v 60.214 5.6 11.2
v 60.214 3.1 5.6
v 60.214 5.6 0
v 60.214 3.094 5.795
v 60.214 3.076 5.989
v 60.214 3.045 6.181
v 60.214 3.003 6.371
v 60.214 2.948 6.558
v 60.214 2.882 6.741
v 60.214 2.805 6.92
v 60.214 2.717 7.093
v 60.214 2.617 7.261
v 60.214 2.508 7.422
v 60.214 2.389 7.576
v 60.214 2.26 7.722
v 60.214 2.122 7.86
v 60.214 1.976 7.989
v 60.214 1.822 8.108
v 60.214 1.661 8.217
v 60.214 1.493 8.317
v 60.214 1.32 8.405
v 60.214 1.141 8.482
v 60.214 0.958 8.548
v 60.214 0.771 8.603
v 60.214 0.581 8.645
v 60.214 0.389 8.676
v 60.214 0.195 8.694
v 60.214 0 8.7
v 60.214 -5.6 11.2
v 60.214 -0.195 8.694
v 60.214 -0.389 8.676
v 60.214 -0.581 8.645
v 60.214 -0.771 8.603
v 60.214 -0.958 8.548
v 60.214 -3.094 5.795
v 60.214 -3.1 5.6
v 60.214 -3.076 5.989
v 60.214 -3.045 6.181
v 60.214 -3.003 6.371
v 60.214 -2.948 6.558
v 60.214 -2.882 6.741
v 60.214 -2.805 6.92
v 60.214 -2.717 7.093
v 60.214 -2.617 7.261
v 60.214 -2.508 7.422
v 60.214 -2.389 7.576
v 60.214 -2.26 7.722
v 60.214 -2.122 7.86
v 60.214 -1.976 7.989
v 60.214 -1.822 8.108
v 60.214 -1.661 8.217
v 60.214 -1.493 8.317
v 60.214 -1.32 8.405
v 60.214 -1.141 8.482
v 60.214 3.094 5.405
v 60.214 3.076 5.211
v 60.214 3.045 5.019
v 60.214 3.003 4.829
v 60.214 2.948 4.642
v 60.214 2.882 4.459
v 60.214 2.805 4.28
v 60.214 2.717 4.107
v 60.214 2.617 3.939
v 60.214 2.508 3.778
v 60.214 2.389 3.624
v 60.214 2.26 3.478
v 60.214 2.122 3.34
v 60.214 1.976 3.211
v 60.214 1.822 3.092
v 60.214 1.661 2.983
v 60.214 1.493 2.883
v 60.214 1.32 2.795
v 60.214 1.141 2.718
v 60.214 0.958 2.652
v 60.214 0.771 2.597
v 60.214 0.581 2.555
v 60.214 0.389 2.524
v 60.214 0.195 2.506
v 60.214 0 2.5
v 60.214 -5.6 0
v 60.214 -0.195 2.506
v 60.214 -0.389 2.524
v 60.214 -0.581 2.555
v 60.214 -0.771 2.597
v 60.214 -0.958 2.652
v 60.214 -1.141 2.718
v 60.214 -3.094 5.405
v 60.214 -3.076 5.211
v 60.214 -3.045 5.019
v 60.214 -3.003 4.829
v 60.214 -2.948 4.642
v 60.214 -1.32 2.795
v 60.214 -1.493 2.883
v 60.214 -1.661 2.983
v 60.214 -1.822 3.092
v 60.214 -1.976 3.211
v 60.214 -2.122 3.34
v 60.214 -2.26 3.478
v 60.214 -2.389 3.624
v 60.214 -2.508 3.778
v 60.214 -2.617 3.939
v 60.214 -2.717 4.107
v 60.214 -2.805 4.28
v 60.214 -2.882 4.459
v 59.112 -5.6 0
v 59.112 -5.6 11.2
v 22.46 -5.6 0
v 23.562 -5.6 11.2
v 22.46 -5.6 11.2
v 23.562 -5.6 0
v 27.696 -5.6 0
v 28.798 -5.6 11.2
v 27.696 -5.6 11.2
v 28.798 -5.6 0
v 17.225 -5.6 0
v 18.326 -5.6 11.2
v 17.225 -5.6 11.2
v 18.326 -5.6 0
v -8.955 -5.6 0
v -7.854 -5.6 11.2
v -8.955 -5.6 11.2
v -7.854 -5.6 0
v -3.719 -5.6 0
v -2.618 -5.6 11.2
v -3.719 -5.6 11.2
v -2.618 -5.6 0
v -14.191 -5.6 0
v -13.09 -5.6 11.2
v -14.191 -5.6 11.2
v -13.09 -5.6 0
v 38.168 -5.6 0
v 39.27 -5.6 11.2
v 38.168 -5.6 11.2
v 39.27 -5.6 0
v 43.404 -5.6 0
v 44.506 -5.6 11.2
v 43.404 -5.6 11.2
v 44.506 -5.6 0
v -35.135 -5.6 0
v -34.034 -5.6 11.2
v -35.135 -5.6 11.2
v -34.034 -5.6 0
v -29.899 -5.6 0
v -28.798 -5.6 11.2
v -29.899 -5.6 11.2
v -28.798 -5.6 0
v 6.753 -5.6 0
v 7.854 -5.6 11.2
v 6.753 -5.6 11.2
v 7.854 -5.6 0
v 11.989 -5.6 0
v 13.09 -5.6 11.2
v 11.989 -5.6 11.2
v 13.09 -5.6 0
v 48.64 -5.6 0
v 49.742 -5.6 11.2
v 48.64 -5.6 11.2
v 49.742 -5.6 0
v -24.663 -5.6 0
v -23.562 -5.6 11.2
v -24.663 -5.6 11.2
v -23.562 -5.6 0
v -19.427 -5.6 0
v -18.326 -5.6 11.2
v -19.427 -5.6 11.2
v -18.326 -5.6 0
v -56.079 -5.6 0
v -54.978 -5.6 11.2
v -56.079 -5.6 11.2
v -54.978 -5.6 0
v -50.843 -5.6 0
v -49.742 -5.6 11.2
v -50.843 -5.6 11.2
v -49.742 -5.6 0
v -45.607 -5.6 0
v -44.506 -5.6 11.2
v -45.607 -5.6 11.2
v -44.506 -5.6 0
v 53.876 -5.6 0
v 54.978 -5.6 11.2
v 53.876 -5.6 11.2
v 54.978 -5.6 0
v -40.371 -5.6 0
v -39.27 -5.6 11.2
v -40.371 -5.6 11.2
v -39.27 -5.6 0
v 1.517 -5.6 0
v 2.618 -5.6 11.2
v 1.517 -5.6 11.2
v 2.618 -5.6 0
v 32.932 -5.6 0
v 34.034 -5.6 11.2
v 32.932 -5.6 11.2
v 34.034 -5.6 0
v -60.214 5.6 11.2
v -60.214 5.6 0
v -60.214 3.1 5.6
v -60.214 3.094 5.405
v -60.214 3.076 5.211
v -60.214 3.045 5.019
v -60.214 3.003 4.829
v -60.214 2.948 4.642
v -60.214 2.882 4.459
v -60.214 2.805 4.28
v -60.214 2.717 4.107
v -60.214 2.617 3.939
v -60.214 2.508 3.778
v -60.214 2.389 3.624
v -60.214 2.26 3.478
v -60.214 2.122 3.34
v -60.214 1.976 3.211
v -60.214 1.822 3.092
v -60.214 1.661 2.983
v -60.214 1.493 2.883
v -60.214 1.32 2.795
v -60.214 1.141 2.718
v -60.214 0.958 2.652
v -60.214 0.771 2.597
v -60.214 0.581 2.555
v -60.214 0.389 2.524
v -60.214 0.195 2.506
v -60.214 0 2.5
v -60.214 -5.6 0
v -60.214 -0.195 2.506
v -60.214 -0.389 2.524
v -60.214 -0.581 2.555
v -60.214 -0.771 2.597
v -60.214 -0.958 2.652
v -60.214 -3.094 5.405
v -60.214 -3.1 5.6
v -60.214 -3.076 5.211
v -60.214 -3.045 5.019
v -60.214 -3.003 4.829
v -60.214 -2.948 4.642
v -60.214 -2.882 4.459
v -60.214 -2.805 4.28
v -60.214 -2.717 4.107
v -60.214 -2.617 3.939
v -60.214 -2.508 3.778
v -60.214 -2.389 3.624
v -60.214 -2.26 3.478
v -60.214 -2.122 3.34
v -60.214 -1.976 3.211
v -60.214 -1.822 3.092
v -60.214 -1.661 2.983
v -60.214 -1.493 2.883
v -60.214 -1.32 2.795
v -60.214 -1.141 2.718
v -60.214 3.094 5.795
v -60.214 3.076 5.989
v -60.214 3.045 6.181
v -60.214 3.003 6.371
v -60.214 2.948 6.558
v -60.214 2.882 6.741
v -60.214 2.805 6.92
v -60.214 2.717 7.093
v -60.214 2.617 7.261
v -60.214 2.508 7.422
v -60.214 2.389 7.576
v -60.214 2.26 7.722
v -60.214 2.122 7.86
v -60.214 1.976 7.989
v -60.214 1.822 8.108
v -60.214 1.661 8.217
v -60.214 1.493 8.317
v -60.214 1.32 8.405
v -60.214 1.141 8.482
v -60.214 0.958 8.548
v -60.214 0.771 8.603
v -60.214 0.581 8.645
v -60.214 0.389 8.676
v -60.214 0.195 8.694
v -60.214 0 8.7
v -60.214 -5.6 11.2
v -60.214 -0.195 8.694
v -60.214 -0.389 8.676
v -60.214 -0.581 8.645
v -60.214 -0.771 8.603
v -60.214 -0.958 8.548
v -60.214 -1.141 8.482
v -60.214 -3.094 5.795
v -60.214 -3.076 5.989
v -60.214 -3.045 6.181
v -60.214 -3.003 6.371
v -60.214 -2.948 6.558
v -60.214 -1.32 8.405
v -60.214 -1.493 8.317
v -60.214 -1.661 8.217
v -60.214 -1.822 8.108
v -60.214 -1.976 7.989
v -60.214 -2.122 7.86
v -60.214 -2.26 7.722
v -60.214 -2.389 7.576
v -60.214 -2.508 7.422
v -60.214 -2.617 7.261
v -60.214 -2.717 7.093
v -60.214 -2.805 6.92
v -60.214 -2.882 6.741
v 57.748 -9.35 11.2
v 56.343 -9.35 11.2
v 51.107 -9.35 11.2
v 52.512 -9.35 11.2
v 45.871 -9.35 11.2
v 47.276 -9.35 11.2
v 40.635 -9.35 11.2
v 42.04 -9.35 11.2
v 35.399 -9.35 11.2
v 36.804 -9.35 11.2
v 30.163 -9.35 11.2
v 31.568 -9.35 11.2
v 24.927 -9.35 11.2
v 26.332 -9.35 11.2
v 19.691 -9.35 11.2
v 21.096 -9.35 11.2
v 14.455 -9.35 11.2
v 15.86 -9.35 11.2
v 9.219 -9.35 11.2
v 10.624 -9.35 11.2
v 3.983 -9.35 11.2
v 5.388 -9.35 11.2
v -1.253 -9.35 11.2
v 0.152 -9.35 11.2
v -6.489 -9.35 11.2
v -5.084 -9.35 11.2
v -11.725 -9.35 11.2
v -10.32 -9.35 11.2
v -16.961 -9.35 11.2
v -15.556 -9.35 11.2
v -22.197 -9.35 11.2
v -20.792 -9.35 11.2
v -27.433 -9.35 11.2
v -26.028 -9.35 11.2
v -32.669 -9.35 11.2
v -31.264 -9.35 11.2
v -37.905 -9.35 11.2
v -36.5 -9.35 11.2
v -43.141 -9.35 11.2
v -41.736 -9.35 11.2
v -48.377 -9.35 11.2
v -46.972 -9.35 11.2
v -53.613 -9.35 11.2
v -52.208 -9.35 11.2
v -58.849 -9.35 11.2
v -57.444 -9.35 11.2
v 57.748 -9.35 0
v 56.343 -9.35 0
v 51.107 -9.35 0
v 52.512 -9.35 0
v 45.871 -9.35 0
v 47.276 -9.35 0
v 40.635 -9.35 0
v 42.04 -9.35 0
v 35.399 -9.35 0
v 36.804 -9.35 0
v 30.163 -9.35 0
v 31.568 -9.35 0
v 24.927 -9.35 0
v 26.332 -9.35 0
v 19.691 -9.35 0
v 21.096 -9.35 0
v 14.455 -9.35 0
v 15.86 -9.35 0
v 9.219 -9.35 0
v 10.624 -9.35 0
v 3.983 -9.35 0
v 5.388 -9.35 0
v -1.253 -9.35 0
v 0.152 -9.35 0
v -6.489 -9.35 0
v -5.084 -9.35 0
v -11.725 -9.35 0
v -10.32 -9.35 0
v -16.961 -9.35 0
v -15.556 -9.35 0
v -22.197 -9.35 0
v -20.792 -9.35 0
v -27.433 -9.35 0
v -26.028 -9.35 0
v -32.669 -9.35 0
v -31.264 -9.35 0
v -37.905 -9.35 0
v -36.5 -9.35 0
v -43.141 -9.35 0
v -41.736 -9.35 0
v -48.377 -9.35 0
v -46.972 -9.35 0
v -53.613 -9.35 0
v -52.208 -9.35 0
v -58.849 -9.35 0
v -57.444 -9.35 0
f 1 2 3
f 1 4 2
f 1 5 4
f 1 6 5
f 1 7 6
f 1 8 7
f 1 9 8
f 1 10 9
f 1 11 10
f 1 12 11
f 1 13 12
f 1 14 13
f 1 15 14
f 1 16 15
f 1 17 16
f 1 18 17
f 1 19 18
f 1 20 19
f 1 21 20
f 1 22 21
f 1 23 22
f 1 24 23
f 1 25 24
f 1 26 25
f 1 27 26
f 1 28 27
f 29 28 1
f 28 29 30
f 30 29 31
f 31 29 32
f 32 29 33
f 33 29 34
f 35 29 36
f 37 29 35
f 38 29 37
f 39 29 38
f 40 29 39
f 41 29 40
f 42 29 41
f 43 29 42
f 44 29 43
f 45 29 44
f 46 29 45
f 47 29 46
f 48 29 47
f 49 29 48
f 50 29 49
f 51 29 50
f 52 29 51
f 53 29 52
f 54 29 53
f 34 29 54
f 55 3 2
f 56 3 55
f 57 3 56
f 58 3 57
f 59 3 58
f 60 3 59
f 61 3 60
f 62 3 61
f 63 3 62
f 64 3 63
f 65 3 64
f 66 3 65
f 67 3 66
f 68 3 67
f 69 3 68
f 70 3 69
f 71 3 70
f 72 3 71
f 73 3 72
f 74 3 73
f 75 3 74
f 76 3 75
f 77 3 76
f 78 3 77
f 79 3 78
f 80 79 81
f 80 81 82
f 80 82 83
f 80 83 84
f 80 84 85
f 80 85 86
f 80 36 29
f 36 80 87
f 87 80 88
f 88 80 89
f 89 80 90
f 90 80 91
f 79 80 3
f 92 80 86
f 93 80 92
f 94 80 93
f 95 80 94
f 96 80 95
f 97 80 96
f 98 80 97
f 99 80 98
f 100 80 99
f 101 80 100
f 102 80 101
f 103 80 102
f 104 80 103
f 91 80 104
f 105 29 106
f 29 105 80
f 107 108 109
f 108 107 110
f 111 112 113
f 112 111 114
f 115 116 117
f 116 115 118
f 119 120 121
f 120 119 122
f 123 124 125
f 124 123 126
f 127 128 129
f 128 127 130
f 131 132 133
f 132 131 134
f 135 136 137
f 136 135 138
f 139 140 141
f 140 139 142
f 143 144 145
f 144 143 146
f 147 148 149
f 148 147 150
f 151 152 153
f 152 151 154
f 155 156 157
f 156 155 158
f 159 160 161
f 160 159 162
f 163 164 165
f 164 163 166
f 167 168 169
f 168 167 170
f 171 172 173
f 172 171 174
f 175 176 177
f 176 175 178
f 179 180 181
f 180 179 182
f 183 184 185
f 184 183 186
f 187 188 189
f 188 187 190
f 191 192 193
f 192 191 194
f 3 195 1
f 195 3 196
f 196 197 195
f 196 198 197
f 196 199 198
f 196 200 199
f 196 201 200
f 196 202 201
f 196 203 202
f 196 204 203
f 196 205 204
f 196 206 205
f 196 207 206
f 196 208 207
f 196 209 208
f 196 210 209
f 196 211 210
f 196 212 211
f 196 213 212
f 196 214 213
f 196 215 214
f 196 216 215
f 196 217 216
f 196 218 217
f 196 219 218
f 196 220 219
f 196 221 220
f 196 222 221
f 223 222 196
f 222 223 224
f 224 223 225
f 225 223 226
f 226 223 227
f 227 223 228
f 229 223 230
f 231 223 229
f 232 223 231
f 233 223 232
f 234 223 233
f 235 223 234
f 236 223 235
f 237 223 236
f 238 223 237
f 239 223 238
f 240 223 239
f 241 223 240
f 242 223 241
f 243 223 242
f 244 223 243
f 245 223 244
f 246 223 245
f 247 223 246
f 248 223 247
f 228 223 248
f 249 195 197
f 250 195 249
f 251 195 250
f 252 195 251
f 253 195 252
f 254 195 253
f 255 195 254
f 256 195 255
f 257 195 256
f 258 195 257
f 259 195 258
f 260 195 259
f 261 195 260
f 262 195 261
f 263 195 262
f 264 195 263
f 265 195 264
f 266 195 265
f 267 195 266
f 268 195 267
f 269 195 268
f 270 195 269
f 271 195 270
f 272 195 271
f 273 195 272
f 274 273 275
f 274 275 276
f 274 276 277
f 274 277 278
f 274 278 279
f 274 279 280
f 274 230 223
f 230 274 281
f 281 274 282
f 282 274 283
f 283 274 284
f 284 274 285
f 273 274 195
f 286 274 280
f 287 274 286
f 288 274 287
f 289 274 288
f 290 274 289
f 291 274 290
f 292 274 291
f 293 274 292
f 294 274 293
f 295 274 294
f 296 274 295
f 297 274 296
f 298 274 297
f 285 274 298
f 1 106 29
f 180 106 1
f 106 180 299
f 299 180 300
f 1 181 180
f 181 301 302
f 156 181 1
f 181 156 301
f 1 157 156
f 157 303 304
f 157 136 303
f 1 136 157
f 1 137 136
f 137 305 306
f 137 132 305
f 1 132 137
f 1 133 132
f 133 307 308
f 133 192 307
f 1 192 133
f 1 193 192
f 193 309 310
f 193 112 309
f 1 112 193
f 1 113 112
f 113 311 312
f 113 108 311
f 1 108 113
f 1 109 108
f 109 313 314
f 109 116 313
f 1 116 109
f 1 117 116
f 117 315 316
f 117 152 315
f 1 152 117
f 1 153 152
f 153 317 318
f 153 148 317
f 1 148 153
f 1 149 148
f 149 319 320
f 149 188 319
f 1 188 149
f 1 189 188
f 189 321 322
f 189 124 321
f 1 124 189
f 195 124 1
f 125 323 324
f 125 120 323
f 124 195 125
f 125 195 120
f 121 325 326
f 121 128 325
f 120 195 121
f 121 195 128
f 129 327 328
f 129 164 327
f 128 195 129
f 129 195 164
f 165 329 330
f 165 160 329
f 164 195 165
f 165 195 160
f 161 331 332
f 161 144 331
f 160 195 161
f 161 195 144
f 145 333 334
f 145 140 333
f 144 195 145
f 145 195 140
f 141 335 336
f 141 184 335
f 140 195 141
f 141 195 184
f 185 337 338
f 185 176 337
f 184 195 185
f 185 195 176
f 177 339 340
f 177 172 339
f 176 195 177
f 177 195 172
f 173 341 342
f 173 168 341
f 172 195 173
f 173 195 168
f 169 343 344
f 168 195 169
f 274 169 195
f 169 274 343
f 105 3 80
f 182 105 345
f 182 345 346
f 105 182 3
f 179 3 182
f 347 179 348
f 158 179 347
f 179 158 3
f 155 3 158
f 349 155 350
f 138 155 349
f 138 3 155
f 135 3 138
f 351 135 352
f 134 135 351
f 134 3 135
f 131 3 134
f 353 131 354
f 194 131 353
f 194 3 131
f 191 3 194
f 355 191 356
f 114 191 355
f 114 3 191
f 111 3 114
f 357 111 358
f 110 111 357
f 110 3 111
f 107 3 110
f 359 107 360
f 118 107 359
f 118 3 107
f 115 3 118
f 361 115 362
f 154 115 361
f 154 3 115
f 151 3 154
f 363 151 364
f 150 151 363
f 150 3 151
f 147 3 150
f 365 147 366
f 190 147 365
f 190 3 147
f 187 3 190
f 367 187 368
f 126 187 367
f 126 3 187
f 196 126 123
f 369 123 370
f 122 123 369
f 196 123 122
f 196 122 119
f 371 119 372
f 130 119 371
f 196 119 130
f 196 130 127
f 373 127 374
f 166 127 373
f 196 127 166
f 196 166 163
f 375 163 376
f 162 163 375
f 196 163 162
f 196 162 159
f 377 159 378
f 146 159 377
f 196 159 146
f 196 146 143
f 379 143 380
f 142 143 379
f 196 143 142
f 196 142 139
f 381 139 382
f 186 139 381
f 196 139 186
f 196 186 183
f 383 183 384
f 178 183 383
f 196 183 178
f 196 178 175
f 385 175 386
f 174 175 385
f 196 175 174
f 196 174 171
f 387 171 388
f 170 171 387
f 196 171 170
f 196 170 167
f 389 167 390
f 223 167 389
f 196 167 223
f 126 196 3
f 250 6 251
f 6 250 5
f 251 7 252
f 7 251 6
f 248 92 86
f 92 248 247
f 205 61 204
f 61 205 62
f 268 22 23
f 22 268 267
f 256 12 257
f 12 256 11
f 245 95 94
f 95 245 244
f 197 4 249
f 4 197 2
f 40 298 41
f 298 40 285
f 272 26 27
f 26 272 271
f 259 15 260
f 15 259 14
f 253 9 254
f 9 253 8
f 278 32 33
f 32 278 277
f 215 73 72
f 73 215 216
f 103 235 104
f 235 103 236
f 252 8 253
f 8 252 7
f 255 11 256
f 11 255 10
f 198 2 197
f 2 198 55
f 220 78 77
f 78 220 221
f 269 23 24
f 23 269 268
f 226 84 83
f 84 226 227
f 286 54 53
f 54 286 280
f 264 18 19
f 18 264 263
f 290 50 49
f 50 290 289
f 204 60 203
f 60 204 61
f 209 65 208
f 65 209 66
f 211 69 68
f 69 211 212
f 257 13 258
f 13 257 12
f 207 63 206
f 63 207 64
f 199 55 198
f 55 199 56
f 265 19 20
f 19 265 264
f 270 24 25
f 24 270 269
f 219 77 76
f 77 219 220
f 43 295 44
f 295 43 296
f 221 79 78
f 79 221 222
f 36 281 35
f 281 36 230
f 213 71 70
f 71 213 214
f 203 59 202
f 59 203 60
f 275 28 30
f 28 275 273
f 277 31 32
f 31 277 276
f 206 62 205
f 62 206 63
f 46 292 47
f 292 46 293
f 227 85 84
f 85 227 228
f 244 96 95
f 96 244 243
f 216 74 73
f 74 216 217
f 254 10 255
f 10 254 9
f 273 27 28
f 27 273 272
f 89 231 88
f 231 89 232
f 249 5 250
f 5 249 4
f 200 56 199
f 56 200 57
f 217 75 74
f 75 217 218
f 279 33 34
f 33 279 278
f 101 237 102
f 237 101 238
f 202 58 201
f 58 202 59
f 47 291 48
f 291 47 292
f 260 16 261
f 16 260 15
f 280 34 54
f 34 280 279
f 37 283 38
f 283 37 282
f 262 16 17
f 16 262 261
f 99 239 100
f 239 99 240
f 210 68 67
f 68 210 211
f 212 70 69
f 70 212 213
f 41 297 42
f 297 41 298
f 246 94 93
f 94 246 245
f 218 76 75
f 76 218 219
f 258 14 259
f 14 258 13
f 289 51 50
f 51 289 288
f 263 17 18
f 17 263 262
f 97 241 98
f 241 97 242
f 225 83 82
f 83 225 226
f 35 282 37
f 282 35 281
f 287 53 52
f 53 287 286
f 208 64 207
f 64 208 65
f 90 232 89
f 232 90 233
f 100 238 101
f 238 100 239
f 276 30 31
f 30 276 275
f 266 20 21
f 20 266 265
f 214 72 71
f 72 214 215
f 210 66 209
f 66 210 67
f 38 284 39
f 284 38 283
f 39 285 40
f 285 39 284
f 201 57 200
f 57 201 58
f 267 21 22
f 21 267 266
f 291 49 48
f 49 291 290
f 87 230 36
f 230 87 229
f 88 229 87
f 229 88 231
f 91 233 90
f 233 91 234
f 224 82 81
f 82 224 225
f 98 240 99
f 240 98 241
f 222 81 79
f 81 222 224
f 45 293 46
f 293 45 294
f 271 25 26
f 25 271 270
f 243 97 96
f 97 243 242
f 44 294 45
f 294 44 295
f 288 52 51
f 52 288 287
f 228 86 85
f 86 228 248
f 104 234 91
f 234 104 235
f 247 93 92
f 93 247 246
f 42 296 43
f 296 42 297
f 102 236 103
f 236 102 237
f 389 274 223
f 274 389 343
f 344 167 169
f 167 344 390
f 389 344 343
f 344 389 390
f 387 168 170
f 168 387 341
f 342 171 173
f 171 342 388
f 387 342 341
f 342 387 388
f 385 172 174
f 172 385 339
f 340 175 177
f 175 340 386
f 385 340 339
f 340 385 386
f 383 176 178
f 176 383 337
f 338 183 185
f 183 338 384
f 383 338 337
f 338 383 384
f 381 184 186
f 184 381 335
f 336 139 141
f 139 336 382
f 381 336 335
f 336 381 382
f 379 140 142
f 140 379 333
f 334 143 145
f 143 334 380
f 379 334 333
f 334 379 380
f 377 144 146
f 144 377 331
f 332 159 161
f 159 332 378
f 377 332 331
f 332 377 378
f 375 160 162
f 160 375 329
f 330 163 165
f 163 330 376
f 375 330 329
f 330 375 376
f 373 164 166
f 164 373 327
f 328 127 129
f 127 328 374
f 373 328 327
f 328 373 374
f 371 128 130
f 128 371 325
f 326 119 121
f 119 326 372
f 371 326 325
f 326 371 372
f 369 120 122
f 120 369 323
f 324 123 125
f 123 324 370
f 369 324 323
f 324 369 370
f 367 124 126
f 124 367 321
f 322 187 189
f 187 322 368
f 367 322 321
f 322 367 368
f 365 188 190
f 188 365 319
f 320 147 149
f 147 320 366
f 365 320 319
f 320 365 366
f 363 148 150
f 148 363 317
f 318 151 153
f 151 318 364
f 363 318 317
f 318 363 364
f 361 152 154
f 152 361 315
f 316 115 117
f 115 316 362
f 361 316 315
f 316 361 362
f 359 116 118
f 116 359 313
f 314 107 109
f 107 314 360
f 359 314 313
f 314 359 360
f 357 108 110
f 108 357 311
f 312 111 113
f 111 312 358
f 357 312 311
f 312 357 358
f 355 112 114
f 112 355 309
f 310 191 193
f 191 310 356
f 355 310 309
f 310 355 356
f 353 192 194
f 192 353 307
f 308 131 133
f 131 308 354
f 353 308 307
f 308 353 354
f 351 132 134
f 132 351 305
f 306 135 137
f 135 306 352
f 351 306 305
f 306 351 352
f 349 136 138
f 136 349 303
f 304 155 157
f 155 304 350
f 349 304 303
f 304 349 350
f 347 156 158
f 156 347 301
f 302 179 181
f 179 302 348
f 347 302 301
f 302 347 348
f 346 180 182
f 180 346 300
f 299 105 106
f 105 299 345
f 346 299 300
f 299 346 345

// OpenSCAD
// Parametric Modular Rack Mark "Ckaos" Moissette
//Based on the work of MattMoses and Fdavies :
//http://forums.reprap.org/read.php?1,51452,52099#msg-52099
//and Forrest Higgs:
// http://technocraticanarchist.blogspot.com/2010/01/high-speed-alternative-to-belts.html
//It is licensed under the Creative Commons - GNU GPL license.
// © 2011 by Mark "Ckaos" Moissette
//more info at :www.kaosat.net and
//http://www.thingiverse.com/thing:6011


pi=3.1415926535897932384626433832795;
innerRadius=3.1;//shaft radius, in mm
borders=2.5;//how thick should the borders around the central "shaft" be, in mm
diametralPitch=12;
numberOfTeeth=23;
pressureAngle=20*pi/180;




//example usage
rack3(innerRadius,borders,diametralPitch,numberOfTeeth,pressureAngle);

module rack3(innerRadius,borders,P,N,PA)
{
	// P = diametral pitch
	// N = number of teeth
	// PA = pressure angle in radians
	// x, y = linear offset distances
	a = 1/P; // addendum (also known as "module")
	d = 1.25/P; // dedendum (this is set by a standard)
	multiplier=20;
	height=(d+a)*multiplier;
	
	
	// find the tangent of pressure angle once
	tanPA = tan(PA*(180/pi));
	// length of bottom and top horizontal segments of tooth profile
	botL = (pi/P/2 - 2*d*tanPA)*multiplier;
	topL =( pi/P/2 - 2*a*tanPA)*multiplier;

	echo("botL",botL);
	echo("topL",topL);
	slantLng=tanPA*height;
	realBase=2*slantLng+topL;
	
	
	offset=topL+botL+2*slantLng;
	length=(realBase+botL)*N;

	echo("realBase",realBase);
	echo("height",height);
	echo("length",length);
	supportSize=(innerRadius+borders)*2;

	rotate([90,0,0])
	{
	translate([0,supportSize/2,0])
	{
	union()
	{
		difference()
		{
			cube(size=[length,supportSize,supportSize],center=true);
			rotate([0,90,0]) 
			{cylinder(h=length+10,r=innerRadius,center=true,$fn=100);}
		}

		for (i = [0:N-1]) 
		{
			translate([i*offset-length/2+realBase/2,0,supportSize/2]) 
			{	
				trapezoid([topL,supportSize],[realBase,supportSize],height);
			}
		}
	}
	}
	}
}



module trapezoid(top,base,height)//top : width*length, same for base
{
	//echo ("test",base[0]);
	basePT1=[
	-base[0]/2,
	base[1]/2,
	0];

	basePT2=[
	base[0]/2,
	base[1]/2,
	0];

	basePT3=[
	base[0]/2,
	-base[1]/2,
	0];

	basePT4=[
	-base[0]/2,
	-base[1]/2,
	0];
	//////////////////////////
	topPT1=[
	-top[0]/2,
	top[1]/2,
	height];

	topPT2=[
	top[0]/2,
	top[1]/2,
	height];

	topPT3=[
	top[0]/2,
	-top[1]/2,
	height];

	topPT4=[
	-top[0]/2,
	-top[1]/2,
	height];
	//////////////////////////

	polyhedron(
	points=[
		basePT1,
		basePT2,
		basePT3,
		basePT4,
		topPT1,
		topPT2,
		topPT3,
		topPT4],
	triangles=[
	//base
	[0,1,2],
	[0,2,3],
	//sides
	[3,7,0],
	[7,4,0],
	//
	[1,6,2],
	[1,5,6],
	//
	[2,6,3],
	[3,6,7],
	//
	[5,1,0],
	[4,5,0],
	//top
	[7,5,4],
	[5,7,6],
	]
	);

}
